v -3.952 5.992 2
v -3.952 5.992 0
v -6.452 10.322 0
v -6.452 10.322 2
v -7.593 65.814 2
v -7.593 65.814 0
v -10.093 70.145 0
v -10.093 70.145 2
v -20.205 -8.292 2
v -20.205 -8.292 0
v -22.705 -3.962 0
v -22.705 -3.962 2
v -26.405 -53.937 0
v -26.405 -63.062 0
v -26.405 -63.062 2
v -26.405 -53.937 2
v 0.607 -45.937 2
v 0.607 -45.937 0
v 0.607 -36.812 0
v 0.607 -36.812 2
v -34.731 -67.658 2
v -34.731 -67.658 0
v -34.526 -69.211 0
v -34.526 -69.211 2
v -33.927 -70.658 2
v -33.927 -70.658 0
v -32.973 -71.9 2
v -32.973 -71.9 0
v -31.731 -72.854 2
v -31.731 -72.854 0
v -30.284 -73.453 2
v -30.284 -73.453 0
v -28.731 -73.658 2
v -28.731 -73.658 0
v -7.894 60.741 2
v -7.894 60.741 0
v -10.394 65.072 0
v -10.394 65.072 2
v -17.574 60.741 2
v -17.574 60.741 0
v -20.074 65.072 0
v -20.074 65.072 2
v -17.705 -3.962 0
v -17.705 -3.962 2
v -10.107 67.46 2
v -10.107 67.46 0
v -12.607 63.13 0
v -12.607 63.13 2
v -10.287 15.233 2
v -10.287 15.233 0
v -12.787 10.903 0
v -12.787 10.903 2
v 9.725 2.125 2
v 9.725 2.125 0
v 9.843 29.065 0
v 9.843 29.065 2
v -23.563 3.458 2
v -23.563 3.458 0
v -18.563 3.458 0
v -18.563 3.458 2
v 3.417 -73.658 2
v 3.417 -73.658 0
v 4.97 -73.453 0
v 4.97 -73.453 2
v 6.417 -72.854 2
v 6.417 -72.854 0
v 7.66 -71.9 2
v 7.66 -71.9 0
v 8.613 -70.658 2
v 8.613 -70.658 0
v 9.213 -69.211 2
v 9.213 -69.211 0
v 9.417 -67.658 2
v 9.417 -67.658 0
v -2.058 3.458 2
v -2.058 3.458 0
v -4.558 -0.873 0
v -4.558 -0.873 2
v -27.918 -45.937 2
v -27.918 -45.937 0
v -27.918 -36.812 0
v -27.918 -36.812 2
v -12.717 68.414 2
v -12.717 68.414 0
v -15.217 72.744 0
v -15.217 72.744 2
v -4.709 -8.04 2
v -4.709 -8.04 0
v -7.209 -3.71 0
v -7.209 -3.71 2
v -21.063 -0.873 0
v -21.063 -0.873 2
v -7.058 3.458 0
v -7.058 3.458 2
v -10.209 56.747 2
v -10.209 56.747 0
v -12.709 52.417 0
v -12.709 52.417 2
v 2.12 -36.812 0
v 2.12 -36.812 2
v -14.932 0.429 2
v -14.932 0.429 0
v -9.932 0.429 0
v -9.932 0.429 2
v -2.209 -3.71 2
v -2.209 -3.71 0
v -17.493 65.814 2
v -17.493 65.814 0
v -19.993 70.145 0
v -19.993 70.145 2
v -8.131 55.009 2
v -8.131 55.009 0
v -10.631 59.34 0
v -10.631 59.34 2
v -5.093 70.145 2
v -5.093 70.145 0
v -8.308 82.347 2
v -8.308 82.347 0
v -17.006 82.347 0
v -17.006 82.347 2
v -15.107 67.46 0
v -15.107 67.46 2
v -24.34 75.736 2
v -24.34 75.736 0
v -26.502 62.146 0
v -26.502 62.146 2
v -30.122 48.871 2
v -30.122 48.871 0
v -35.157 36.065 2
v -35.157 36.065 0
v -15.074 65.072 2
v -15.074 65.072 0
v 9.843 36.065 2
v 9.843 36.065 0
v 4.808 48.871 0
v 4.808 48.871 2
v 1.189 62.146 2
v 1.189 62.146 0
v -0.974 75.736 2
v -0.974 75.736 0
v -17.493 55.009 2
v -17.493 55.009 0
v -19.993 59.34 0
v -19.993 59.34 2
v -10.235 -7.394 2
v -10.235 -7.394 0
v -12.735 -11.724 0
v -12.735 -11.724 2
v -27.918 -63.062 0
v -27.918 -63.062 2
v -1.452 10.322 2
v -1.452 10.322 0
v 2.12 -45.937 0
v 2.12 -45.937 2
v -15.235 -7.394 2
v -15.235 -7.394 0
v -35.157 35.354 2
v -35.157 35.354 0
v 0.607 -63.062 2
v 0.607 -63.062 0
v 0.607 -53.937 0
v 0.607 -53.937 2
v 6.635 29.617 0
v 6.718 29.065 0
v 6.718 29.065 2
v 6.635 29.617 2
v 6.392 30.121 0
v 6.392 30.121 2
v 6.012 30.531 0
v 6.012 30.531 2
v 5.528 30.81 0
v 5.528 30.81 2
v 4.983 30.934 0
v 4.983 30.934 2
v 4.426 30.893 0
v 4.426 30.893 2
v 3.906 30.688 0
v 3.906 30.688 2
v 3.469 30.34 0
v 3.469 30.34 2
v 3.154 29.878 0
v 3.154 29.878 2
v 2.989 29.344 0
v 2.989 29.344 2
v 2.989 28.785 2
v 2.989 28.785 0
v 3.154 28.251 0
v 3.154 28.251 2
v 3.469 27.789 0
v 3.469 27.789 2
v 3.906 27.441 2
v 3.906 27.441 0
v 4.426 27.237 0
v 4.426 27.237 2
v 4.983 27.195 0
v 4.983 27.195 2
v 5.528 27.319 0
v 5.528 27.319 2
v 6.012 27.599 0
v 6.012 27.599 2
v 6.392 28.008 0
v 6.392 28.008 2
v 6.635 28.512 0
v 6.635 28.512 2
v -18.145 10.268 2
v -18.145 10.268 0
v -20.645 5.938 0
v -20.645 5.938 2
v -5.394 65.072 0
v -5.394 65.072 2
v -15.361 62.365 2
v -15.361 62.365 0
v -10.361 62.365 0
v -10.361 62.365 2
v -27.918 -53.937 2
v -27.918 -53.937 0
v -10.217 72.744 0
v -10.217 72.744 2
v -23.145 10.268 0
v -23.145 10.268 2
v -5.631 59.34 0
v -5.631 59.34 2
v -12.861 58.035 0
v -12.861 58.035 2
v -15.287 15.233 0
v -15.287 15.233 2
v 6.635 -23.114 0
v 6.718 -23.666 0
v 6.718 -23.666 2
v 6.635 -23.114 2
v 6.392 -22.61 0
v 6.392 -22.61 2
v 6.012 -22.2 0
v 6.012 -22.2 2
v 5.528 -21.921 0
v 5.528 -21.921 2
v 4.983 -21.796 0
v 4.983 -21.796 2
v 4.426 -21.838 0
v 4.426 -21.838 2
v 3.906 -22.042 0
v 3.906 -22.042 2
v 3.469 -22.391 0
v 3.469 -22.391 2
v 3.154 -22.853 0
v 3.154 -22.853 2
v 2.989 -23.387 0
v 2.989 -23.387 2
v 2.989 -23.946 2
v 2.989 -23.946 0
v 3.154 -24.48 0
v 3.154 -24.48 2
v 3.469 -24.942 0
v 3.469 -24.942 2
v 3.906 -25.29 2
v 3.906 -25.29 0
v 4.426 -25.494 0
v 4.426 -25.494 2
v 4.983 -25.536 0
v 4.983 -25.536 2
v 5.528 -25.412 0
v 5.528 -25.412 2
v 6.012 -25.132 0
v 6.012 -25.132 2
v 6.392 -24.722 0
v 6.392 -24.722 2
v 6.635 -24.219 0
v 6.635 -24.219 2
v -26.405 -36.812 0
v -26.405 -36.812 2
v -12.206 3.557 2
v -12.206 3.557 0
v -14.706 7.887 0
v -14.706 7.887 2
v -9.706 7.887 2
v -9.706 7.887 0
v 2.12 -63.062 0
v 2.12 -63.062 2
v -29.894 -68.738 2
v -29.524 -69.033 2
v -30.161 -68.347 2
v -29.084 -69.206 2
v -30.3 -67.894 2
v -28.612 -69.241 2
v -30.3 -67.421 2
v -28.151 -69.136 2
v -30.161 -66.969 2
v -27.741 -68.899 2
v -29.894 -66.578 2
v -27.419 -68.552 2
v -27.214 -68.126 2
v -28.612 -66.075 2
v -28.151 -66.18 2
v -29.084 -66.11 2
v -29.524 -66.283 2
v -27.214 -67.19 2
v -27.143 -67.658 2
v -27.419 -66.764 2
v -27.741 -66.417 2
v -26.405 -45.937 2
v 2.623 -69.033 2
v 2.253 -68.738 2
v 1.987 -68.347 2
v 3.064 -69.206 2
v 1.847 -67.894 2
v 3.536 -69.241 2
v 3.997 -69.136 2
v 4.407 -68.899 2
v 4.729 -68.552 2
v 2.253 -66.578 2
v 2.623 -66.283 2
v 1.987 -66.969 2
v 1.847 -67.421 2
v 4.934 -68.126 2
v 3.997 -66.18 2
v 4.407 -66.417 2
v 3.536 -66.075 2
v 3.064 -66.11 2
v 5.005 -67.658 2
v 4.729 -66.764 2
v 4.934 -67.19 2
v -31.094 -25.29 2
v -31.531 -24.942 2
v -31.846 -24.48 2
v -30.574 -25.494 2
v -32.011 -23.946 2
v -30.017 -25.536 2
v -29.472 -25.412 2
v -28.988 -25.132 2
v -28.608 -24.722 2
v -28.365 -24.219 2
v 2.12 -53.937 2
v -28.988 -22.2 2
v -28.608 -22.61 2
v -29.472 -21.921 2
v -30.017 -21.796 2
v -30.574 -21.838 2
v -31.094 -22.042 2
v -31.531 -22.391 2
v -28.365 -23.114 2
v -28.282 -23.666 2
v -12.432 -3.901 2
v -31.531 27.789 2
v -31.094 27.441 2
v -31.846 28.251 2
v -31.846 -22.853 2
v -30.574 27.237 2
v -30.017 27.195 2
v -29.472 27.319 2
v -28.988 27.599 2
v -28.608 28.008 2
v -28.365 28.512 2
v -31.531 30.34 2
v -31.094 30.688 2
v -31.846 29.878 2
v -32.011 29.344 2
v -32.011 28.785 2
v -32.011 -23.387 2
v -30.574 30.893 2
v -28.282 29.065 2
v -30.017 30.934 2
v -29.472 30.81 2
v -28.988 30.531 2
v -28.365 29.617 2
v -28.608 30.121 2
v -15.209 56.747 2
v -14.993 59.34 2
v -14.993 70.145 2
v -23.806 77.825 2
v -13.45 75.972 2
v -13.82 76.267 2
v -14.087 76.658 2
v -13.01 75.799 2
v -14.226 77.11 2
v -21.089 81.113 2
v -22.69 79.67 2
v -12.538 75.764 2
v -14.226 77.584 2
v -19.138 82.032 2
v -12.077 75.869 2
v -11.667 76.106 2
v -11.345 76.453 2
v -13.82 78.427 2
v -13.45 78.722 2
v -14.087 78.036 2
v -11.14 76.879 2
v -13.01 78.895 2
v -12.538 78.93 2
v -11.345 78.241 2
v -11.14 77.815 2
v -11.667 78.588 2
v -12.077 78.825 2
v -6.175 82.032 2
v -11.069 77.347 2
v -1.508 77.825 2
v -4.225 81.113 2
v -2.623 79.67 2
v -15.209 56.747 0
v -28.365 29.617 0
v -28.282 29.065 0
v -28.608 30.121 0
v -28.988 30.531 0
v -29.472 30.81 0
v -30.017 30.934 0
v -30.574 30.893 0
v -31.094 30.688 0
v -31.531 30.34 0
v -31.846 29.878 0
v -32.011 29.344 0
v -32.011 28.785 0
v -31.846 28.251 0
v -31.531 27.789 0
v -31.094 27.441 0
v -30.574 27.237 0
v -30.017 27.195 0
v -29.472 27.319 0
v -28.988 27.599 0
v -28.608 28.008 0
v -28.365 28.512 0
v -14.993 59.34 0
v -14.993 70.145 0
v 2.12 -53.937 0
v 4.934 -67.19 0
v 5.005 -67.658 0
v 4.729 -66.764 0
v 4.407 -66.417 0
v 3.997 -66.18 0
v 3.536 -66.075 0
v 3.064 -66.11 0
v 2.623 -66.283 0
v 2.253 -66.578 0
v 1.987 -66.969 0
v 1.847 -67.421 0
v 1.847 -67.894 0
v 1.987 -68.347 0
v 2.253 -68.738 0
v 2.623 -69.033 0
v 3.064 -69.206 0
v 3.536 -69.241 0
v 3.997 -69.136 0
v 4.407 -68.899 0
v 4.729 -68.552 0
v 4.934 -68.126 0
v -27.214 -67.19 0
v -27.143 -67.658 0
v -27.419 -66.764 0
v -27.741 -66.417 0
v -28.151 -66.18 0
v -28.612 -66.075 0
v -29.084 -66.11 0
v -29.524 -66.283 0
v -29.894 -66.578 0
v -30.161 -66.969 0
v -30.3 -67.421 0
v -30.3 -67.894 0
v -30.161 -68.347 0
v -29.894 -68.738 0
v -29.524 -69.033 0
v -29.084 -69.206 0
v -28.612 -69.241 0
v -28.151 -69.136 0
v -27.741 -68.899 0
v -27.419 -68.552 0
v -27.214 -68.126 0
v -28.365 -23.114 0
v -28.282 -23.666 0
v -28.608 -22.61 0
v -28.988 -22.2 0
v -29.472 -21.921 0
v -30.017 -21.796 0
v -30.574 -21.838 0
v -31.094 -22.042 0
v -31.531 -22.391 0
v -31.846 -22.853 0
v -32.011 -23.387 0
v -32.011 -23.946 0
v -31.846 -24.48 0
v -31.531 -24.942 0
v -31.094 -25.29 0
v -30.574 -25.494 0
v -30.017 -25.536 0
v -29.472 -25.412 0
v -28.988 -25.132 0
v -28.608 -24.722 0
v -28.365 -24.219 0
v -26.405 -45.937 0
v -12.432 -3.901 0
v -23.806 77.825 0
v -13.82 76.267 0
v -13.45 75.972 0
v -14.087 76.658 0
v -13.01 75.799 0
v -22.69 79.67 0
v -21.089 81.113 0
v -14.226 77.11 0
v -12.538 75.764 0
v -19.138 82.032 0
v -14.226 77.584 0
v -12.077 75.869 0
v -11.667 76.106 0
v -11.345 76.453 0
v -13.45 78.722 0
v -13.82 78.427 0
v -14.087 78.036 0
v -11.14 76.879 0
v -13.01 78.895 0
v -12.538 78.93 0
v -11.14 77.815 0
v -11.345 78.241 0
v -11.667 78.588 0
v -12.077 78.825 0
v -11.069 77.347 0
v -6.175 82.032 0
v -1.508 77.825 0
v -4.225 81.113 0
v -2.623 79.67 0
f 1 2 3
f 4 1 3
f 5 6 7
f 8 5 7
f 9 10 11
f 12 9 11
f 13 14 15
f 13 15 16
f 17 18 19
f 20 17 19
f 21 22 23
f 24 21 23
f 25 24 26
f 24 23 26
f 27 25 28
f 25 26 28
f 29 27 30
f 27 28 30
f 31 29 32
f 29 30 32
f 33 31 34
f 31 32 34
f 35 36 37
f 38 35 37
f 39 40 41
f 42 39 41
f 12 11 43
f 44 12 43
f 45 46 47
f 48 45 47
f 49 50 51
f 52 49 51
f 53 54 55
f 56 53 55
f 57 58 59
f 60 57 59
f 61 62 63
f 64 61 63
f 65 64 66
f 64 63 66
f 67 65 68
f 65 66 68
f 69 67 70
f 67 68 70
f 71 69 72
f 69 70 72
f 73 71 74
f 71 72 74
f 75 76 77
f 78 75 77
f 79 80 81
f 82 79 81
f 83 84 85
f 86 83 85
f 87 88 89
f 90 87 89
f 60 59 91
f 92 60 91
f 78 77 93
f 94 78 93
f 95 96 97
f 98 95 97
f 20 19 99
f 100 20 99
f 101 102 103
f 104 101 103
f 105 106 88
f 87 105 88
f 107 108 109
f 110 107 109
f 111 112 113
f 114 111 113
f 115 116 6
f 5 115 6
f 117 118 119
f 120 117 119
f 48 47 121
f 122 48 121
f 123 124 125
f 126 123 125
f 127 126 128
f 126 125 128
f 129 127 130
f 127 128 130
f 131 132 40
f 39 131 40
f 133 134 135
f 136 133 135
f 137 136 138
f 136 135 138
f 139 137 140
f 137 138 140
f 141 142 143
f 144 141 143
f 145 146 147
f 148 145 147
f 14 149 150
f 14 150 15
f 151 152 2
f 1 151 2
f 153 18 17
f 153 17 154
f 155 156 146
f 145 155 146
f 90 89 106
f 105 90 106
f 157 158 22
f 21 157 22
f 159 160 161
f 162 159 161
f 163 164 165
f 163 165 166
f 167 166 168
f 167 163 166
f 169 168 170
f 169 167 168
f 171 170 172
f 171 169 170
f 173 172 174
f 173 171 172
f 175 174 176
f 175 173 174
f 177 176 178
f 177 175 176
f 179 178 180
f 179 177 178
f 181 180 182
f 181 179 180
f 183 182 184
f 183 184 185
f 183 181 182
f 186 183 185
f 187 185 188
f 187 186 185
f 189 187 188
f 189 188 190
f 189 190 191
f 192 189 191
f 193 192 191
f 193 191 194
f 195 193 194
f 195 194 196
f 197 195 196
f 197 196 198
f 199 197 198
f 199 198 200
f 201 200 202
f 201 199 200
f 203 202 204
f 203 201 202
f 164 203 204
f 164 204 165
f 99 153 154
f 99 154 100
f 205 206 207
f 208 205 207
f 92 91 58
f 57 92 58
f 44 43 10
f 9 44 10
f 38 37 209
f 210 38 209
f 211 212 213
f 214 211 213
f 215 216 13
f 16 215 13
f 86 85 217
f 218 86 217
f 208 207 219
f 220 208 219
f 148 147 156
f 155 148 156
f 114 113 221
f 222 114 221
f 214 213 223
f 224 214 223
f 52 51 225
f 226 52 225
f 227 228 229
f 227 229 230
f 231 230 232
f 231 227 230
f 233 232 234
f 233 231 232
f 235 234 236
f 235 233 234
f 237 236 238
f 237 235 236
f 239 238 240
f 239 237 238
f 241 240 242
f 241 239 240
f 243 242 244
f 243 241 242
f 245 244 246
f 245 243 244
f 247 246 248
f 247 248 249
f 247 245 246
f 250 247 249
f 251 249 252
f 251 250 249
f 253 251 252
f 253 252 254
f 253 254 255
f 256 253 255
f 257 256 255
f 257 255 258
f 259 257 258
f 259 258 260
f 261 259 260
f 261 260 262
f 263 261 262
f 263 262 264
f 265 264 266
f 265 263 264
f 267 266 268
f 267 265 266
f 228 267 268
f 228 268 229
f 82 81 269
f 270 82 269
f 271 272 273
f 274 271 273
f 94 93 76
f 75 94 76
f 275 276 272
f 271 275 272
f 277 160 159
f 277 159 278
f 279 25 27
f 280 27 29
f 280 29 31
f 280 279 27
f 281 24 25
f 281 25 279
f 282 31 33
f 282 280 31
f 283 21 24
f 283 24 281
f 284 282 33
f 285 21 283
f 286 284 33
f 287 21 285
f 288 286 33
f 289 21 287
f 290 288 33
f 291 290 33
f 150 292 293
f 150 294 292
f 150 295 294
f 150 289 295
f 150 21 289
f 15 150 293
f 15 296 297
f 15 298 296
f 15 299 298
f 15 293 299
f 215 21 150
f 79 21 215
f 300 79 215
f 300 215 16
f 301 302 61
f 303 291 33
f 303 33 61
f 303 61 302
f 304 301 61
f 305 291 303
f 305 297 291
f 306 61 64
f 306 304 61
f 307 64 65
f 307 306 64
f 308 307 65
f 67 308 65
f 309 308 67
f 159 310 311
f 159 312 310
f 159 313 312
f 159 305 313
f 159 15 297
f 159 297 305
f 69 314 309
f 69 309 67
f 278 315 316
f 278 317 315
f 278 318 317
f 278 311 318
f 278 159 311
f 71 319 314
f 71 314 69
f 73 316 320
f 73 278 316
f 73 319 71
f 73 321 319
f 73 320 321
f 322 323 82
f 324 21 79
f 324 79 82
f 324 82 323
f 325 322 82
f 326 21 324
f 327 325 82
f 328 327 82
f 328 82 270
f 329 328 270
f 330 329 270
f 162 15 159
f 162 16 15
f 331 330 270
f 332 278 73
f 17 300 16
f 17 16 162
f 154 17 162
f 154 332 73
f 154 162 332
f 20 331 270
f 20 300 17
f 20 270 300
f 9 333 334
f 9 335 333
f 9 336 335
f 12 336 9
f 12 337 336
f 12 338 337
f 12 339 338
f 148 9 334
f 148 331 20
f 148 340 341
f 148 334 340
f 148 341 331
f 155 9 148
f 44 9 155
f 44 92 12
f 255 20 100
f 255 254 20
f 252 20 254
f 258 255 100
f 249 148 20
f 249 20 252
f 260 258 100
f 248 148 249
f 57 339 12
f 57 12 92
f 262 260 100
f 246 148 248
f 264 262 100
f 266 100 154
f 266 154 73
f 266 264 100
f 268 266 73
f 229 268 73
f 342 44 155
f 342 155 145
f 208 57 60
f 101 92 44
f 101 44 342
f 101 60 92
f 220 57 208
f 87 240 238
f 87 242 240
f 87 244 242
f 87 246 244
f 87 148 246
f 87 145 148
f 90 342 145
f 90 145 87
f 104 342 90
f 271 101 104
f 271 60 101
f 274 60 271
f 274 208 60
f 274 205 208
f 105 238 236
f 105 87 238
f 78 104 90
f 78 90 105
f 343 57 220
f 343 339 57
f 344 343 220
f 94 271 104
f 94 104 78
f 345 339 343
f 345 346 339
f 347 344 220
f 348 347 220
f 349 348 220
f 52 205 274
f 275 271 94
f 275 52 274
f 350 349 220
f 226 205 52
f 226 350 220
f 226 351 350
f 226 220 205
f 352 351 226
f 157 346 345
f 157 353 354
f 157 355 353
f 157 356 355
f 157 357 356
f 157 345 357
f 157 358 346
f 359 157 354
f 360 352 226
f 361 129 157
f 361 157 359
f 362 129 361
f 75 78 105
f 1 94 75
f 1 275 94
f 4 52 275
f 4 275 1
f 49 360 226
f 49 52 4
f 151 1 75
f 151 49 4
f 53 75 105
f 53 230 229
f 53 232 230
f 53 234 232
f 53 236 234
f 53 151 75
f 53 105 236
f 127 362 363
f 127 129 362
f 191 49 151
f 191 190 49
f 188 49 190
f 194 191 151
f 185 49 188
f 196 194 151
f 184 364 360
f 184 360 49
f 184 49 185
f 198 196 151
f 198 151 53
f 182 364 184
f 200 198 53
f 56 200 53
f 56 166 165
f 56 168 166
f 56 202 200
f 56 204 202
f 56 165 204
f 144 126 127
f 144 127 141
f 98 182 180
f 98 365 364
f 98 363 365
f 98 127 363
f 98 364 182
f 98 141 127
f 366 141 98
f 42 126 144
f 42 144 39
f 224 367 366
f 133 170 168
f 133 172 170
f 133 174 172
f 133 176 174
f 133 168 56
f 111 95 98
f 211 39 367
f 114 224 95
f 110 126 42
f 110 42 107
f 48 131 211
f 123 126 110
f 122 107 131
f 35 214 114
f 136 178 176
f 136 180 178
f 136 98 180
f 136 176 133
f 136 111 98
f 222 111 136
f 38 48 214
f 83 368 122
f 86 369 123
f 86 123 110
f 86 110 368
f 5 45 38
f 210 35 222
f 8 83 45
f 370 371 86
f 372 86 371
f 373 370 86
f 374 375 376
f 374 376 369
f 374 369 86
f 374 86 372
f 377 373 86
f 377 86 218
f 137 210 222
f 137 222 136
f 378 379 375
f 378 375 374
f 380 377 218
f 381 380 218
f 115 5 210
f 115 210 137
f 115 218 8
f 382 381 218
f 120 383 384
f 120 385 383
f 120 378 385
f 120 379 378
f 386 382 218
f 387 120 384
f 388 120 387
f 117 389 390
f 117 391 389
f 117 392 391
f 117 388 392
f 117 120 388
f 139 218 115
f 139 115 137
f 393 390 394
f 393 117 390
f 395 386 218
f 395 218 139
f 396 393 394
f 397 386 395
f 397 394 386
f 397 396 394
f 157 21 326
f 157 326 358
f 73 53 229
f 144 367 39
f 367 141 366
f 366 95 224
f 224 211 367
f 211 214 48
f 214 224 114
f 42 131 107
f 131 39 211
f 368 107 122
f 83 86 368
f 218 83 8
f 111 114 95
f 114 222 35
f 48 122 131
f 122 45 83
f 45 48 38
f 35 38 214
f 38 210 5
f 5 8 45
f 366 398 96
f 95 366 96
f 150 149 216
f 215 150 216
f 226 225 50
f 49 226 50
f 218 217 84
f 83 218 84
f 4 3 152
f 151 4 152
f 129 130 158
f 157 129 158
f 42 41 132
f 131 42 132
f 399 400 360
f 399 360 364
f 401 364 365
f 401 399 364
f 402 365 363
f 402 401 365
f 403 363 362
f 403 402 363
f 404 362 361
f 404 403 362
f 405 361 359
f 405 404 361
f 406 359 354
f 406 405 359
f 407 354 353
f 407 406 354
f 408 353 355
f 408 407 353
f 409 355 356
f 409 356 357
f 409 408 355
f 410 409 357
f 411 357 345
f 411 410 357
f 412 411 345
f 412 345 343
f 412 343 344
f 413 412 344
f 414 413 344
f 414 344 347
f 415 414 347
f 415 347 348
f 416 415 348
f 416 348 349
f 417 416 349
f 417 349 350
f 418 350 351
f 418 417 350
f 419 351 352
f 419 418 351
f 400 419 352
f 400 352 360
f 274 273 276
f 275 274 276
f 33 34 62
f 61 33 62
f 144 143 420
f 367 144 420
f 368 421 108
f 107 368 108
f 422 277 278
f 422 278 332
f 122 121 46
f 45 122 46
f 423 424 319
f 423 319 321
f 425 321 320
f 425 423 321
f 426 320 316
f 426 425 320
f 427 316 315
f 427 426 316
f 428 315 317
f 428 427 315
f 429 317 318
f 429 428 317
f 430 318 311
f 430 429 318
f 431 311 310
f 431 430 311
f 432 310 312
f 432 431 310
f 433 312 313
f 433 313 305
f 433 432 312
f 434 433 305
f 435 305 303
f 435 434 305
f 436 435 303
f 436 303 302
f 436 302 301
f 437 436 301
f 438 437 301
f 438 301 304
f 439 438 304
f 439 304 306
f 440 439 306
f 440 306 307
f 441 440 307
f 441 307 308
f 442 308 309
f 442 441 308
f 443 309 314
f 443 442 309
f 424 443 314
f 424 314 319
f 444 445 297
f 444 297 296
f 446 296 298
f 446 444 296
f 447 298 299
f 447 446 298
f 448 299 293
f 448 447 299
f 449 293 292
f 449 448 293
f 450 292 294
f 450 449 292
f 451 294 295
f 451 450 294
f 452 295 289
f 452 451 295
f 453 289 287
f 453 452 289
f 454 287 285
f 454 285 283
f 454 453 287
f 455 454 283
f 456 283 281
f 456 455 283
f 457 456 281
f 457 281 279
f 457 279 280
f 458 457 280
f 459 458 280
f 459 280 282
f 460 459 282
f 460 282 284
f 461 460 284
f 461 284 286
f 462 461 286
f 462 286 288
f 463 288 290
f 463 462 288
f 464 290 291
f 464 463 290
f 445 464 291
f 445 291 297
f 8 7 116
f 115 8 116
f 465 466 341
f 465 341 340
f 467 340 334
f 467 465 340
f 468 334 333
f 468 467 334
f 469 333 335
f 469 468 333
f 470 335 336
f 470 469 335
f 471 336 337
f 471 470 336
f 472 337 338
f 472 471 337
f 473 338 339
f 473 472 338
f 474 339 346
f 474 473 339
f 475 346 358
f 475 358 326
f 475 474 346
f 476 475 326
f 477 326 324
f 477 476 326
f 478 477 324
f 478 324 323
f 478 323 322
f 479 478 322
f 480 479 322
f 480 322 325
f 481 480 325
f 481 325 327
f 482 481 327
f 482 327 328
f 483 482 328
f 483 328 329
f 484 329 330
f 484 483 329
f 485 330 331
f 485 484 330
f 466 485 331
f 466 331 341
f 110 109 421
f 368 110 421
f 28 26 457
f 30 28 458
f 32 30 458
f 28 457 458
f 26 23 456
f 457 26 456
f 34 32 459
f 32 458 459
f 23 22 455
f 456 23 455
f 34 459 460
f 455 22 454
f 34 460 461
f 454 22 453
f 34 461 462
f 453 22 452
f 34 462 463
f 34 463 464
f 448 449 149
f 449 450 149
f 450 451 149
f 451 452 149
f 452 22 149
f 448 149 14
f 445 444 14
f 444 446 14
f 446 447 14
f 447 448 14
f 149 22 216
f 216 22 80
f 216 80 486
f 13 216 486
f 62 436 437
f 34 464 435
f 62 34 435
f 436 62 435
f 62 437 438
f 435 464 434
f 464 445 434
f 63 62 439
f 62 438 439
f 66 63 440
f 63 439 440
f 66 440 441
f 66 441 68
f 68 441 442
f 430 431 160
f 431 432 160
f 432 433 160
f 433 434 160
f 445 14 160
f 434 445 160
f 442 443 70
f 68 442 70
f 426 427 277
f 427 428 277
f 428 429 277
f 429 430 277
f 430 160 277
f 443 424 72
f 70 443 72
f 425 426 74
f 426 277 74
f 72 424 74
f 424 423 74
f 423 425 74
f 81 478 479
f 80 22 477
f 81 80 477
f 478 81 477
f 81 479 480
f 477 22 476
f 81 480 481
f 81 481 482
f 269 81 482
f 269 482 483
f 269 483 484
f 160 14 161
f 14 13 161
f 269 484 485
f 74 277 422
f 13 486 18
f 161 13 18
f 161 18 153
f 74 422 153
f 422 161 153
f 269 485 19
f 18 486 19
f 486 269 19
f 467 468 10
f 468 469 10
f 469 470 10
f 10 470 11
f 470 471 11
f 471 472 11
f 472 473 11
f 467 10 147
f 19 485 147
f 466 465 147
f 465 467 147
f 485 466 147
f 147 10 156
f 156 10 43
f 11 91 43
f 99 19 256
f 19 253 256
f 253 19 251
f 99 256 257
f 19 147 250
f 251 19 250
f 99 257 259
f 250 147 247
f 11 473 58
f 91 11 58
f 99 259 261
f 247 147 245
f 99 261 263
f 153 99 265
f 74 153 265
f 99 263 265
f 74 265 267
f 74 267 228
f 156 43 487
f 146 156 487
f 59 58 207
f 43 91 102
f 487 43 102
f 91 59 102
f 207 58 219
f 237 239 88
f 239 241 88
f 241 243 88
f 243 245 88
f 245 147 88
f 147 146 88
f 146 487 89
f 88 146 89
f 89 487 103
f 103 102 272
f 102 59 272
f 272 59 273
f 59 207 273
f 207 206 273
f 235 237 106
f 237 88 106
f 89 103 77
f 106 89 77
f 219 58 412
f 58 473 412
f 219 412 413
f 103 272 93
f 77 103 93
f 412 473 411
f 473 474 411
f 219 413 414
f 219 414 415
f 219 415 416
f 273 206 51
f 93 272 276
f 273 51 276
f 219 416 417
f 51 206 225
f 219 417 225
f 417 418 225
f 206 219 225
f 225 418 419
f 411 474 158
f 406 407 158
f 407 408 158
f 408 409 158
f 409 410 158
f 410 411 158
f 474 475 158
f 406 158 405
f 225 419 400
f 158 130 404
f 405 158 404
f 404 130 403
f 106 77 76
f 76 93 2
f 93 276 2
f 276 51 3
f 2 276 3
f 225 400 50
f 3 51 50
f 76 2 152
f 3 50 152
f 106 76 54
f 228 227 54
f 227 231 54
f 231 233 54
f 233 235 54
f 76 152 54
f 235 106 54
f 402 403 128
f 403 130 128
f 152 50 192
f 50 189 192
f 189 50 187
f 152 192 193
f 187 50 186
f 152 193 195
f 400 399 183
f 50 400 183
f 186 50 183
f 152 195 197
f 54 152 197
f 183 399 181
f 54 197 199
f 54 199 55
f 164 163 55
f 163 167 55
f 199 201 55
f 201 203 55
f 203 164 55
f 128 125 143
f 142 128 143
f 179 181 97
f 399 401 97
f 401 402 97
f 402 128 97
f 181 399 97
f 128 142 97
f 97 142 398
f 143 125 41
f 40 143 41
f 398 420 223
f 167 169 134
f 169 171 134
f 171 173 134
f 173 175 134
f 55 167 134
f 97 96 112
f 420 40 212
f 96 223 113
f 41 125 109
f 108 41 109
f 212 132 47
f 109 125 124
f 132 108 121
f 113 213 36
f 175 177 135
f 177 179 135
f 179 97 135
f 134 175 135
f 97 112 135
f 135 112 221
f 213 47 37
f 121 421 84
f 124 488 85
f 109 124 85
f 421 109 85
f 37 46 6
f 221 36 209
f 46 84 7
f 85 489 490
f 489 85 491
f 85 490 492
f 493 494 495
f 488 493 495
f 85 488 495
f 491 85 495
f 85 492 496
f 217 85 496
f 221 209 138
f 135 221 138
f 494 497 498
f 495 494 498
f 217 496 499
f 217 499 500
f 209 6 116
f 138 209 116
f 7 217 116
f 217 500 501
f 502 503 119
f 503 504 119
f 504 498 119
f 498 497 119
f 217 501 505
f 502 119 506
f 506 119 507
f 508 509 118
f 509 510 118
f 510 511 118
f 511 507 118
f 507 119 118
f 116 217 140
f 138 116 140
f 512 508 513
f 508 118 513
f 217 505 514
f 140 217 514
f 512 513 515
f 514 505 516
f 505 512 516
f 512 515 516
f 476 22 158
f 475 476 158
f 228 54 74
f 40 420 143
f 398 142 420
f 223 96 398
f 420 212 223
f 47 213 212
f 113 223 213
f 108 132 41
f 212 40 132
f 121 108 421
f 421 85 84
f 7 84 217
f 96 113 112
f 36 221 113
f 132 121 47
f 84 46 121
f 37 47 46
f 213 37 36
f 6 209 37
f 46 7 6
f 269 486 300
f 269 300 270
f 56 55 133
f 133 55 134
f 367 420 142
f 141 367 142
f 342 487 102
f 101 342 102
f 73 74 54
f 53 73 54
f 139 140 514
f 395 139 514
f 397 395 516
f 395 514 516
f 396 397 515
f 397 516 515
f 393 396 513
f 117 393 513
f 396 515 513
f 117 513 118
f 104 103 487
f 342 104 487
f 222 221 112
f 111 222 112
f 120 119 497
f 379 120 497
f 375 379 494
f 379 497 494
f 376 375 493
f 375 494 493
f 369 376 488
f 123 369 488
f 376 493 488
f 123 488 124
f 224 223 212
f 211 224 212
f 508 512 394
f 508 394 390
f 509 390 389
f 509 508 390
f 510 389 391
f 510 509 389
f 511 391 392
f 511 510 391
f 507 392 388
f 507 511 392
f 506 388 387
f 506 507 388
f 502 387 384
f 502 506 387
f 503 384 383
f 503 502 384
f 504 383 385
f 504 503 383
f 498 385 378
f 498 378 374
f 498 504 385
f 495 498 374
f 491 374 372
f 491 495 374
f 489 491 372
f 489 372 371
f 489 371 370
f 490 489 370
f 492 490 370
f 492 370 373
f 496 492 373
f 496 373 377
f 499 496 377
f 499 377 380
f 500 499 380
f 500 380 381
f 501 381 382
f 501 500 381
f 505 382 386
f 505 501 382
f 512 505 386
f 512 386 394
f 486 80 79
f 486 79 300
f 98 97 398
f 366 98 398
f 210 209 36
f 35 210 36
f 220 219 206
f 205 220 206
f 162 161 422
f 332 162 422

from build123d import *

# Parameters (mm, degrees)
F0_R     = 1.5875
F0_W     = 1.5125
F0_H     = 9.125
F0_R_2   = 1.875
F1_DEPTH = 2


with BuildPart() as f1:
    # F0 (on Top) → F1 (new body)
    with BuildSketch(Plane.XY):
        with BuildLine():
            Line((-8.3077662669, 82.3469734799), (-12.6567107354, 82.3469734799))
            Line((-12.6567107354, 82.3469734799), (-17.0056552038, 82.3469734799))
            ThreePointArc((-17.0056552038, 82.3469734799), (-21.9425943503, 80.450262999), (-24.3396503152, 75.7359230148))
            ThreePointArc((-24.3396503152, 75.7359230148), (-28.1319401622, 55.4595641269), (-35.1567107354, 36.0645959539))
            Line((-35.1567107354, 36.0645959539), (-35.1567107354, 35.3542267511))
            Line((-35.1567107354, 35.3542267511), (-34.7306092033, -67.6578189428))
            ThreePointArc((-34.7306092033, -67.6578189428), (-32.9732498904, -71.9004596299), (-28.7306092033, -73.6578189428))
            Line((-28.7306092033, -73.6578189428), (3.4171877326, -73.6578189428))
            ThreePointArc((3.4171877326, -73.6578189428), (7.6598284197, -71.9004596299), (9.4171877326, -67.6578189428))
            Line((9.4171877326, -67.6578189428), (9.7246083807, 2.1247686199))
            Line((9.7246083807, 2.1247686199), (9.8432892646, 29.0645959539))
            Line((9.8432892646, 29.0645959539), (9.8432892646, 35.3542267511))
            Line((9.8432892646, 35.3542267511), (9.8432892646, 36.0645959539))
            ThreePointArc((9.8432892646, 36.0645959539), (2.8185186915, 55.4595641269), (-0.9737711555, 75.7359230148))
            ThreePointArc((-0.9737711555, 75.7359230148), (-3.3708271204, 80.450262999), (-8.3077662669, 82.3469734799))
        make_face()
        with Locations((-28.7306092033, -67.6578189428)):
            Circle(F0_R, mode=Mode.SUBTRACT)
        with Locations((-27.1615939174, -58.4994030434)):
            Rectangle(F0_W, F0_H, mode=Mode.SUBTRACT)
        with Locations((-27.1615939174, -41.3744030434)):
            Rectangle(F0_W, F0_H, mode=Mode.SUBTRACT)
        with Locations((-30.1567107354, -23.6662209918)):
            Circle(F0_R_2, mode=Mode.SUBTRACT)
        Polygon((-22.7049022828, -3.962064999), (-17.7049022828, -3.962064999), (-20.2049022828, -8.2921920179), align=None, mode=Mode.SUBTRACT)
        Polygon((-23.5629521225, 3.4575584355), (-18.5629521225, 3.4575584355), (-21.0629521225, -0.8725685834), align=None, mode=Mode.SUBTRACT)
        Polygon((-15.23480489, -7.3942718085), (-10.23480489, -7.3942718085), (-12.73480489, -11.7243988275), align=None, mode=Mode.SUBTRACT)
        with Locations((3.4171877326, -67.6578189428)):
            Circle(F0_R, mode=Mode.SUBTRACT)
        with Locations((1.3634060826, -58.4994030434)):
            Rectangle(F0_W, F0_H, mode=Mode.SUBTRACT)
        with Locations((1.3634060826, -41.3744030434)):
            Rectangle(F0_W, F0_H, mode=Mode.SUBTRACT)
        Polygon((-14.9319611404, 0.4291358414), (-9.9319611404, 0.4291358414), (-12.4319611404, -3.9009911775), align=None, mode=Mode.SUBTRACT)
        Polygon((-7.2094976817, -3.709698933), (-2.2094976817, -3.709698933), (-4.7094976817, -8.039825952), align=None, mode=Mode.SUBTRACT)
        Polygon((-7.0580758069, 3.4575584355), (-2.0580758069, 3.4575584355), (-4.5580758069, -0.8725685834), align=None, mode=Mode.SUBTRACT)
        with Locations((4.8432892646, -23.6662209918)):
            Circle(F0_R_2, mode=Mode.SUBTRACT)
        with Locations((-30.1567107354, 29.0645959539)):
            Circle(F0_R_2, mode=Mode.SUBTRACT)
        Polygon((-23.1448143635, 10.267657322), (-18.1448143635, 10.267657322), (-20.6448143635, 5.9375303031), align=None, mode=Mode.SUBTRACT)
        Polygon((-15.2871601198, 15.2332606736), (-10.2871601198, 15.2332606736), (-12.7871601198, 10.9031336547), align=None, mode=Mode.SUBTRACT)
        Polygon((-19.9925371002, 59.3395778543), (-14.9925371002, 59.3395778543), (-17.4925371002, 55.0094508354), align=None, mode=Mode.SUBTRACT)
        Polygon((-15.2093276296, 56.7469392914), (-10.2093276296, 56.7469392914), (-12.7093276296, 52.4168122725), align=None, mode=Mode.SUBTRACT)
        Polygon((-15.3613381002, 62.3649583209), (-10.3613381002, 62.3649583209), (-12.8613381002, 58.034831302), align=None, mode=Mode.SUBTRACT)
        Polygon((-20.0741064349, 65.0715577427), (-15.0741064349, 65.0715577427), (-17.5741064349, 60.7414307238), align=None, mode=Mode.SUBTRACT)
        Polygon((-19.9925371002, 70.1445944501), (-14.9925371002, 70.1445944501), (-17.4925371002, 65.8144674312), align=None, mode=Mode.SUBTRACT)
        Polygon((-15.2171917174, 72.7440145343), (-10.2171917174, 72.7440145343), (-12.7171917174, 68.4138875154), align=None, mode=Mode.SUBTRACT)
        Polygon((-14.7060893391, 7.8873719099), (-9.7060893391, 7.8873719099), (-12.2060893391, 3.557244891), align=None, mode=Mode.SUBTRACT)
        Polygon((-6.4523920331, 10.3219720546), (-1.4523920331, 10.3219720546), (-3.9523920331, 5.9918450356), align=None, mode=Mode.SUBTRACT)
        with Locations((4.8432892646, 29.0645959539)):
            Circle(F0_R_2, mode=Mode.SUBTRACT)
        Polygon((-10.6306696928, 59.3395778543), (-5.6306696928, 59.3395778543), (-8.1306696928, 55.0094508354), align=None, mode=Mode.SUBTRACT)
        Polygon((-15.1065990243, 67.459733436), (-10.1065990243, 67.459733436), (-12.6065990243, 63.1296064171), align=None, mode=Mode.SUBTRACT)
        Polygon((-10.3938269644, 65.0715577427), (-5.3938269644, 65.0715577427), (-7.8938269644, 60.7414307238), align=None, mode=Mode.SUBTRACT)
        Polygon((-10.0930306195, 70.1445944501), (-5.0930306195, 70.1445944501), (-7.5930306195, 65.8144674312), align=None, mode=Mode.SUBTRACT)
        with Locations((-12.6567107354, 77.3469734799)):
            Circle(F0_R, mode=Mode.SUBTRACT)
    extrude(amount=F1_DEPTH)


solid = f1.part
